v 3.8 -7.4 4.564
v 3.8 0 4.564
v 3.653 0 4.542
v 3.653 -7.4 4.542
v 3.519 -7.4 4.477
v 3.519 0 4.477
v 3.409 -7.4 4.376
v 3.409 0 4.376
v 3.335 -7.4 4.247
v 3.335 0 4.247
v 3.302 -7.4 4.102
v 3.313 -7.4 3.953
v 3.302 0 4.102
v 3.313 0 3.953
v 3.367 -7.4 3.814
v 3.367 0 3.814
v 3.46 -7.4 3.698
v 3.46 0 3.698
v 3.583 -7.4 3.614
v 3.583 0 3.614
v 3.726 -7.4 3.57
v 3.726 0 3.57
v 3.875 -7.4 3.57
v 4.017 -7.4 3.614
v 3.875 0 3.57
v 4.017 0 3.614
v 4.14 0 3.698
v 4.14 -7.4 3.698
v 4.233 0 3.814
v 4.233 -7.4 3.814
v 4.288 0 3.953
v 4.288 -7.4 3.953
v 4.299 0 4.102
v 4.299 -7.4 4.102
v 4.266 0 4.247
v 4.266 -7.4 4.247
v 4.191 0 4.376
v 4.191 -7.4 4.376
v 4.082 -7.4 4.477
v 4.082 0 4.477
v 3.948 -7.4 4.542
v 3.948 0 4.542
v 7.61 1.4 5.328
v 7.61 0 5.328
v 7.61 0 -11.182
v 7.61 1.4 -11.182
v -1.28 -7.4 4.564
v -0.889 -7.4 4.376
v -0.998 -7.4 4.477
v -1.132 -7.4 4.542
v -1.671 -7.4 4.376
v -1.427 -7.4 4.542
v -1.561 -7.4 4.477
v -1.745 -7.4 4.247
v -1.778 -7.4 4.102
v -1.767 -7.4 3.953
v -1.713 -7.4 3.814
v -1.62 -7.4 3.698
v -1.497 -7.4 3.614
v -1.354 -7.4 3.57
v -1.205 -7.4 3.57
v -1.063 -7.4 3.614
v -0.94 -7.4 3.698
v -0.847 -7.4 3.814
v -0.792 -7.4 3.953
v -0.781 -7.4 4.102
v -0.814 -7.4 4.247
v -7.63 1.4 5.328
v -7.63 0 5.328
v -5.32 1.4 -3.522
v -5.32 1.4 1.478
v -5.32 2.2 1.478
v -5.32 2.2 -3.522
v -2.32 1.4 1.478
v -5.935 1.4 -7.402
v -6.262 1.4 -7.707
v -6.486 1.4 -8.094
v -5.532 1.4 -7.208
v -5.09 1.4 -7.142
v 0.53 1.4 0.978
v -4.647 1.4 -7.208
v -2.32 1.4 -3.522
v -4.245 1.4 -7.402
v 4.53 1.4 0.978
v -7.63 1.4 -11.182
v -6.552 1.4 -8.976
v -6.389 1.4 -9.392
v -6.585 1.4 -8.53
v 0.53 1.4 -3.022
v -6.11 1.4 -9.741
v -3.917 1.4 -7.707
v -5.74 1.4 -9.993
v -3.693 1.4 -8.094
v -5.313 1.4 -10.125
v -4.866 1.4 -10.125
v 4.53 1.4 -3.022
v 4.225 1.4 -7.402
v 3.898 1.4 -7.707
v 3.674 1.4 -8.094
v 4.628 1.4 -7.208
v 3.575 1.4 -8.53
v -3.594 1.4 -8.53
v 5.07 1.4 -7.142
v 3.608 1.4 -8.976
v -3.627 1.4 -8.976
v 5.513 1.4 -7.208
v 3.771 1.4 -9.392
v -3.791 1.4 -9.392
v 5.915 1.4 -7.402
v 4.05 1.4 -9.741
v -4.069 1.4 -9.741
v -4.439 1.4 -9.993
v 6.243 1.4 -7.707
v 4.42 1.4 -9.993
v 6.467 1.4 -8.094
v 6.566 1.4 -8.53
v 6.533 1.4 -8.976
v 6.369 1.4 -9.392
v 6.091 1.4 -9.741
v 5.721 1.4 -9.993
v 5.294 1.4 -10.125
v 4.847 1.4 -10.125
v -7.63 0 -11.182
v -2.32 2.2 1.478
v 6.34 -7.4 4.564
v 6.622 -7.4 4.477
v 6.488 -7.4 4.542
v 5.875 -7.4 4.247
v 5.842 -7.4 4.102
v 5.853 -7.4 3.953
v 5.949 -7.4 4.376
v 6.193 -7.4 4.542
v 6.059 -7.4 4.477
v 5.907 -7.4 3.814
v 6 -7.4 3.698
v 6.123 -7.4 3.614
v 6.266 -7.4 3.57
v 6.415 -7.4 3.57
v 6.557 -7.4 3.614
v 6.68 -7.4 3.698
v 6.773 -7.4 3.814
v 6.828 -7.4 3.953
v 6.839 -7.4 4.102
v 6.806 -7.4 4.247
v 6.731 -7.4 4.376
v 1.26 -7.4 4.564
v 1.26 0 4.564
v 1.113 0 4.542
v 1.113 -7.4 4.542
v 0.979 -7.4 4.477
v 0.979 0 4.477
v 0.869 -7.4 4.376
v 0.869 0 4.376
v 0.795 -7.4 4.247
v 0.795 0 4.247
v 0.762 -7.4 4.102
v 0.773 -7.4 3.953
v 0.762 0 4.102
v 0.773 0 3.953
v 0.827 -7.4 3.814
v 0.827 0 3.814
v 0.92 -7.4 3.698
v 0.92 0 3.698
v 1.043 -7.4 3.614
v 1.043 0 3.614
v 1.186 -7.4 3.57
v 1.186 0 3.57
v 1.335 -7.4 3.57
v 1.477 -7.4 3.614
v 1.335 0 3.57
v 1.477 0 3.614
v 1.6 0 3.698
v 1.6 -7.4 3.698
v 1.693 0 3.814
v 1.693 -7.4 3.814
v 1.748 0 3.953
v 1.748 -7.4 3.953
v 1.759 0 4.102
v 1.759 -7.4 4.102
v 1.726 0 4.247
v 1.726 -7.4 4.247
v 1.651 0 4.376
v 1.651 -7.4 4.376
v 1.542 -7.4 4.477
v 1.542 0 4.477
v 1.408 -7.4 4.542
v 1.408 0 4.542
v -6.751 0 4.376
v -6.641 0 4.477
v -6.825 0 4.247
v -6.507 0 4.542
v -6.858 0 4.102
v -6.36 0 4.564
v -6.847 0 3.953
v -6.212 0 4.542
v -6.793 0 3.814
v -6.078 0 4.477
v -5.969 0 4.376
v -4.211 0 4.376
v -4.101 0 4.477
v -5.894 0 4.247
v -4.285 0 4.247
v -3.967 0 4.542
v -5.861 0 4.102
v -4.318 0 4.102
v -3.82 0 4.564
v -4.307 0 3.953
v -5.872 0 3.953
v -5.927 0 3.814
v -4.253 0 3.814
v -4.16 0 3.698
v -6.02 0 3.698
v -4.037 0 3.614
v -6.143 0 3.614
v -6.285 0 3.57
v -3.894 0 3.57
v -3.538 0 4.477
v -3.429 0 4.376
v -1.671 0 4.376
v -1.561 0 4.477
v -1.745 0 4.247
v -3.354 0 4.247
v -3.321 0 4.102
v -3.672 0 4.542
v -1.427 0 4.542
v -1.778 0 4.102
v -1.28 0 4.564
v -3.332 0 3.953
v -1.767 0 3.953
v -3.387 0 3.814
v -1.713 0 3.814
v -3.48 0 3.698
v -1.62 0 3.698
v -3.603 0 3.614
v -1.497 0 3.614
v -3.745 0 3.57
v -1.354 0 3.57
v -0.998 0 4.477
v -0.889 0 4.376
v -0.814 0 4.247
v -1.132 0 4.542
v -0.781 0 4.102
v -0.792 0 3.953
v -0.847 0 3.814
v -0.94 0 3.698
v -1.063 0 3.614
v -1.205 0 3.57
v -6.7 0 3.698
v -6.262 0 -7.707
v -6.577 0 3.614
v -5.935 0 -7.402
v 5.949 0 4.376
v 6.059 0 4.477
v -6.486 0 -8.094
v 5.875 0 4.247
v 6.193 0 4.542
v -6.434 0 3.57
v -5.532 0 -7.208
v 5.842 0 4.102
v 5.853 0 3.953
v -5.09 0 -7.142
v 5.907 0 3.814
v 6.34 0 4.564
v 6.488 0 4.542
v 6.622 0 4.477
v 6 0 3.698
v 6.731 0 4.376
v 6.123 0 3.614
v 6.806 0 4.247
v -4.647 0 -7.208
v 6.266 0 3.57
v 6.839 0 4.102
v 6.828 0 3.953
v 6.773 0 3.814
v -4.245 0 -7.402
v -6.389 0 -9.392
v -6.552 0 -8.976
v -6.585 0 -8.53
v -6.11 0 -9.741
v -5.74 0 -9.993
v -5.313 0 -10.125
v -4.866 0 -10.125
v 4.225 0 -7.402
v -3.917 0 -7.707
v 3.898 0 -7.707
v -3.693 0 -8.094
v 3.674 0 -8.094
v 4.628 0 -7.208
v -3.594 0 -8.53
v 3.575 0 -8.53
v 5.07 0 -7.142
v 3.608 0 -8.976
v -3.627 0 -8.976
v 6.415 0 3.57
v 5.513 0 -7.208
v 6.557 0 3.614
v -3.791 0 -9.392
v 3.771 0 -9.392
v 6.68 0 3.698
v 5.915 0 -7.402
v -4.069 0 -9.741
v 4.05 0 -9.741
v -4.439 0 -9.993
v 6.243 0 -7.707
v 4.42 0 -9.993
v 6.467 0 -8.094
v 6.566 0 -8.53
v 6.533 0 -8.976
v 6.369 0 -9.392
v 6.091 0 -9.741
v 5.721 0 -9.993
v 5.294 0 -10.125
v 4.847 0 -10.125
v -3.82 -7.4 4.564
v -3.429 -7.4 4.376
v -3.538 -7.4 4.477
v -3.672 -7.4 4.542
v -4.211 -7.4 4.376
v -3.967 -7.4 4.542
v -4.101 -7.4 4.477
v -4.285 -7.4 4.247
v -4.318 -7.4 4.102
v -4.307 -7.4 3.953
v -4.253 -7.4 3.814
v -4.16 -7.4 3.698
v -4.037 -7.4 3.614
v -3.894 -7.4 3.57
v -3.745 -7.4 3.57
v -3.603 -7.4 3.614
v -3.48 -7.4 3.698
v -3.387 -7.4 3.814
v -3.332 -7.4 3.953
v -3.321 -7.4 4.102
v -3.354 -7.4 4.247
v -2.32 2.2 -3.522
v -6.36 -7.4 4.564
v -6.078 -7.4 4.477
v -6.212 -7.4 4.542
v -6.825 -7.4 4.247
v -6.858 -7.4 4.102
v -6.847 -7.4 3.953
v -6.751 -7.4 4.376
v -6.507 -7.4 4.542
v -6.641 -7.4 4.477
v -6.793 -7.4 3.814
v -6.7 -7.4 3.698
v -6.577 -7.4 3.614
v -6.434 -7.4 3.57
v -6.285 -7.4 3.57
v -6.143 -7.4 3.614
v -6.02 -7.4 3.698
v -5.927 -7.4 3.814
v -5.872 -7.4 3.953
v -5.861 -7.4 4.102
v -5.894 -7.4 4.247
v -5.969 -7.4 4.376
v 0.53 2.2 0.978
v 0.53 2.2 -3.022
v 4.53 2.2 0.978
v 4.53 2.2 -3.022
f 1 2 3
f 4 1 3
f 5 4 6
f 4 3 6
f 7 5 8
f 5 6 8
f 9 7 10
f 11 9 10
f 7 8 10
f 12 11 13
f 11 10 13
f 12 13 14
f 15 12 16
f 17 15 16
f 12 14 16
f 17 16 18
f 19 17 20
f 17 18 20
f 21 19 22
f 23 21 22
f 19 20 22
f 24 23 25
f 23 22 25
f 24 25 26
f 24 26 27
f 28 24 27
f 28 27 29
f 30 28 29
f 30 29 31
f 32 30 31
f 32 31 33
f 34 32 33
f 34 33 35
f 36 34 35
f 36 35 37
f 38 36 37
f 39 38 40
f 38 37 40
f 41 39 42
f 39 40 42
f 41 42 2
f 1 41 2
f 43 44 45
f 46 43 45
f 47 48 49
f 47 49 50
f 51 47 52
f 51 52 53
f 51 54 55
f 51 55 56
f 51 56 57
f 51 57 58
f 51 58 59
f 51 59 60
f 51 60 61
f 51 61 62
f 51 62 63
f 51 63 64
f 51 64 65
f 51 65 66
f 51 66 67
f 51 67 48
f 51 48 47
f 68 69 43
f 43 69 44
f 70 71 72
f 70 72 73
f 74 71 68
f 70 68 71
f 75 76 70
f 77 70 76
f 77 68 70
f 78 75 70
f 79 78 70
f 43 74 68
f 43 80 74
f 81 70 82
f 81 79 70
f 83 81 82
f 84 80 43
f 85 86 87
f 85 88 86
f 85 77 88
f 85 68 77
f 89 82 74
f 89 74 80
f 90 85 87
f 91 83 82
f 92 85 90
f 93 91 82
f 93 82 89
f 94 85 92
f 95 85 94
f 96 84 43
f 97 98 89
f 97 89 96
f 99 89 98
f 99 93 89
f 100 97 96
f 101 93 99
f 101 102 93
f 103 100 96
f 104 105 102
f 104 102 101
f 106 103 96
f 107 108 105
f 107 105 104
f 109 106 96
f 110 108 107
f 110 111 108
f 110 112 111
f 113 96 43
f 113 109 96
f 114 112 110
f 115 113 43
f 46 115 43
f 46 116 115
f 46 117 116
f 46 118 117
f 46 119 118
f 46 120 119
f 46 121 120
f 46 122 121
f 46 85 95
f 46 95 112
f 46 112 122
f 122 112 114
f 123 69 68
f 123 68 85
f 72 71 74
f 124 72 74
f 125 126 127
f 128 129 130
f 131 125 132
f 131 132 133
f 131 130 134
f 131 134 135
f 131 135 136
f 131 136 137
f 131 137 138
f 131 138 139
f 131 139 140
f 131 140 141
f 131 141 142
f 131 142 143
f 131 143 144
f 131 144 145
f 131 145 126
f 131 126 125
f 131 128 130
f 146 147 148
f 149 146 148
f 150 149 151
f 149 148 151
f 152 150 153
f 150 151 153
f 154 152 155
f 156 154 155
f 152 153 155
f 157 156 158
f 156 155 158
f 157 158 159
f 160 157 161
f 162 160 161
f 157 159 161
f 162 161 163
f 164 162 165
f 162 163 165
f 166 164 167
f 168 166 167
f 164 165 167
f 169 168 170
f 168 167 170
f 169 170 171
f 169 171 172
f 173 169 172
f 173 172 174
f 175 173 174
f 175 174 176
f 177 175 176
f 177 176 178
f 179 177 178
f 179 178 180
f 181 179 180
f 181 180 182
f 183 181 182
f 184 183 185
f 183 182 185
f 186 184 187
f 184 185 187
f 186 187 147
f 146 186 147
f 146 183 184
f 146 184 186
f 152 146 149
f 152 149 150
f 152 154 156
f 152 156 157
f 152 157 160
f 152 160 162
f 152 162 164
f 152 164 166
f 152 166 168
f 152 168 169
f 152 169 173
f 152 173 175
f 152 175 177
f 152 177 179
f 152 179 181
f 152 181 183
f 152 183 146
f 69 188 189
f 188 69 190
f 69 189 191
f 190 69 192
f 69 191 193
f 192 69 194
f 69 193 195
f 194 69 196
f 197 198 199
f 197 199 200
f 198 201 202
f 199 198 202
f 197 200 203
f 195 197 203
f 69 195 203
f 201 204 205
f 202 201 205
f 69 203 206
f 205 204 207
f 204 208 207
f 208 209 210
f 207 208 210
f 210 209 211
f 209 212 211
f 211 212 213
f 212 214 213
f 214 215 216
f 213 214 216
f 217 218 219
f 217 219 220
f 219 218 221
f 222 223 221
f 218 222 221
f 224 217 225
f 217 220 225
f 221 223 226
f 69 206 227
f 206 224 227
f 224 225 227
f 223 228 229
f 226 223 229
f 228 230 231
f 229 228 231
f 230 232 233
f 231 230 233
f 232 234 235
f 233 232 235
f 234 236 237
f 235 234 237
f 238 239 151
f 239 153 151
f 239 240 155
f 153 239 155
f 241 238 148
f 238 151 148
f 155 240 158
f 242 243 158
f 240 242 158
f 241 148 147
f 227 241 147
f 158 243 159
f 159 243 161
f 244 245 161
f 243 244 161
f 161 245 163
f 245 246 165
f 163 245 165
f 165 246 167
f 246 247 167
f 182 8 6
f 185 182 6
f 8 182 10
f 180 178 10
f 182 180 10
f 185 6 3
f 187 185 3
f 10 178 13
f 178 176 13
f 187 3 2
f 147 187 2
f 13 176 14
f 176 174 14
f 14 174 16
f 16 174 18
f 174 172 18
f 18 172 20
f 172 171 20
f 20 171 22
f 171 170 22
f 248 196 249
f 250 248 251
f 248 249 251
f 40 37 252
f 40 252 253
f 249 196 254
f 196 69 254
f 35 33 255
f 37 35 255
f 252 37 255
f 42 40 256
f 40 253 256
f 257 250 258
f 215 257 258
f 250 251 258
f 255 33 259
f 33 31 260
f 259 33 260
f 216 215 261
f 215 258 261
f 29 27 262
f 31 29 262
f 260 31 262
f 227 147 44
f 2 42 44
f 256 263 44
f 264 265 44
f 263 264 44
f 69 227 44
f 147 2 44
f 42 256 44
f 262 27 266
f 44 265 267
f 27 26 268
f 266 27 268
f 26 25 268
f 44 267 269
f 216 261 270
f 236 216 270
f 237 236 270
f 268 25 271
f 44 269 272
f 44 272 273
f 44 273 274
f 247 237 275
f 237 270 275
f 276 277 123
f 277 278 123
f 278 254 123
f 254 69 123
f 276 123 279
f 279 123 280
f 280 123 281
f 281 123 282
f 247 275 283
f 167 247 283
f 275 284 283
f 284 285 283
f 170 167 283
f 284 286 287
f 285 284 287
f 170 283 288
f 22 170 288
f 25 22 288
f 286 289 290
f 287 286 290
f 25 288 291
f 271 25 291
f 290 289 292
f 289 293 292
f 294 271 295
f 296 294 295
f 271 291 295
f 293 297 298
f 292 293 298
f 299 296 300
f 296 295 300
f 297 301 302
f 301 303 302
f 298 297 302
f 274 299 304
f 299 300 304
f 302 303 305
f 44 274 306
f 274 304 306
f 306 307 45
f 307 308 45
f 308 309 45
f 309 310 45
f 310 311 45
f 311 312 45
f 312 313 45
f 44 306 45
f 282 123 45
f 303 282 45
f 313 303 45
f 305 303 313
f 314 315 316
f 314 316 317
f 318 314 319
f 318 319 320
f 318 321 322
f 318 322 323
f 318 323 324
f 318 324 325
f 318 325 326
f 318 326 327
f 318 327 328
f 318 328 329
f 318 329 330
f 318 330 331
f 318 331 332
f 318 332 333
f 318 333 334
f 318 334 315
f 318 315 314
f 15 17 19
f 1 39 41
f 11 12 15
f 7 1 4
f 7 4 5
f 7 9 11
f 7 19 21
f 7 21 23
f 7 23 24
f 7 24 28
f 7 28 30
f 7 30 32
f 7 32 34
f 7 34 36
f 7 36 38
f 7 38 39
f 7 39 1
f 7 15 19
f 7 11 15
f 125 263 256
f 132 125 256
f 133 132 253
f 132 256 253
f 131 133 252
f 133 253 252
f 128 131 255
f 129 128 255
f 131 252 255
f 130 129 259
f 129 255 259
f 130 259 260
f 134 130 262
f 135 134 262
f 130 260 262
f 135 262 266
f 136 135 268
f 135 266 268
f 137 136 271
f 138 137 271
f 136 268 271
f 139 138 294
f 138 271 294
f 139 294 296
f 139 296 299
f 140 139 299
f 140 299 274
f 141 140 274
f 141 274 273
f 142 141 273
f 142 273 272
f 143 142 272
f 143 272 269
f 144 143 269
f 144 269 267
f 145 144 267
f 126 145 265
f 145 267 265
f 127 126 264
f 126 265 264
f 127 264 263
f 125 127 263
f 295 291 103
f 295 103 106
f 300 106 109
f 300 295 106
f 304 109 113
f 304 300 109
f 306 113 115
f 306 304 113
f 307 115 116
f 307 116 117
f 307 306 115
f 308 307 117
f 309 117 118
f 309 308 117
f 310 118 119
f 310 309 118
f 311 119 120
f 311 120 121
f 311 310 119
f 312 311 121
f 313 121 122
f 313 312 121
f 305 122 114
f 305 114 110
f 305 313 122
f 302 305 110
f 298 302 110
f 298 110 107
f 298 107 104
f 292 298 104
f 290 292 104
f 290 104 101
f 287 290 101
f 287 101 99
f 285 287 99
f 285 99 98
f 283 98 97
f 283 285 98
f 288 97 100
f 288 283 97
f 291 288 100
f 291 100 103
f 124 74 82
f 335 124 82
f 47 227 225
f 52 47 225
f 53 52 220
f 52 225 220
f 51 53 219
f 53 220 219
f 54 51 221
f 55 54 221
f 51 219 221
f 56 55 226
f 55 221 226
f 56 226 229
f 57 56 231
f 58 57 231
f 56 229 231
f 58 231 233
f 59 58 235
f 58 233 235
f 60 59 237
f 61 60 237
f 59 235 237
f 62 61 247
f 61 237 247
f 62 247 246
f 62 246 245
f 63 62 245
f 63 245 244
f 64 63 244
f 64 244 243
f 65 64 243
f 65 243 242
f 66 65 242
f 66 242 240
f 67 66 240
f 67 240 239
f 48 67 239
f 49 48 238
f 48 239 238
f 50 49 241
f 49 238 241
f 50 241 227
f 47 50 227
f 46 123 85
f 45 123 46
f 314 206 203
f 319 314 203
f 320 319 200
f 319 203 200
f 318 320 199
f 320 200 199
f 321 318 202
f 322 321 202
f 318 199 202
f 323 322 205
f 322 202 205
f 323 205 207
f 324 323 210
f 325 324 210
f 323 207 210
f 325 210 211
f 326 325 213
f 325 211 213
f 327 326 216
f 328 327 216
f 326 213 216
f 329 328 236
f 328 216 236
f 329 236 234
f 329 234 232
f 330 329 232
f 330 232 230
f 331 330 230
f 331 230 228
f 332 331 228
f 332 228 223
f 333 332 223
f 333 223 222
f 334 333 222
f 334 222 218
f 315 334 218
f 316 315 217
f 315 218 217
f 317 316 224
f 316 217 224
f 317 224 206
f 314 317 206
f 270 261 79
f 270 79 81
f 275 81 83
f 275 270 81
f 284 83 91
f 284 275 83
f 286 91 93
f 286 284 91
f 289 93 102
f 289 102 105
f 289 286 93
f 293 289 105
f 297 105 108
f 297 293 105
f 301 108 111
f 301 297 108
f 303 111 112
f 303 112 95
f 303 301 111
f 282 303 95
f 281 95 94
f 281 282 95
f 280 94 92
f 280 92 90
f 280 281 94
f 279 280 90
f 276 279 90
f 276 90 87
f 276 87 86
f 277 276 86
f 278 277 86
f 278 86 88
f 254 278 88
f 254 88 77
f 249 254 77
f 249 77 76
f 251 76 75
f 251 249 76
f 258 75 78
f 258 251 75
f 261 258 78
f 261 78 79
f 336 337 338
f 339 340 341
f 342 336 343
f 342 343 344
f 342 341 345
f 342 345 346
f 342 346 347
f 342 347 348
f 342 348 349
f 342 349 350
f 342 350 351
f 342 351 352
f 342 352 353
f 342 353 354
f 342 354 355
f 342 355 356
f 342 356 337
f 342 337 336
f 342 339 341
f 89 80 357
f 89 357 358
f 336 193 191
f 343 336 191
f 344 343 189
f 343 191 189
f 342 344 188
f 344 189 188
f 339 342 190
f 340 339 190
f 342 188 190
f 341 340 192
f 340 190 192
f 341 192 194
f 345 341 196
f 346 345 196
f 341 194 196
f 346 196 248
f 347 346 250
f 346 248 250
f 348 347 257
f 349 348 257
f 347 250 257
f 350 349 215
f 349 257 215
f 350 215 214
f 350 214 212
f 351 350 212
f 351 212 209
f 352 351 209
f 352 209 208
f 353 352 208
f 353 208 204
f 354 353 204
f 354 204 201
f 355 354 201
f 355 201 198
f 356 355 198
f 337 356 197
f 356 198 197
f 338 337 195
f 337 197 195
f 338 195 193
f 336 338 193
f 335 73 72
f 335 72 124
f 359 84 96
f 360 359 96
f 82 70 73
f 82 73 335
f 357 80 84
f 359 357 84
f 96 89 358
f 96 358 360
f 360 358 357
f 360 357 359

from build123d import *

# Parameters (mm, degrees)
ESQUISSE1_W        = 15.24
ESQUISSE1_H        = 16.51
ESQUISSE1_R        = 1.5
PCB_DEPTH          = 1.4
ESQUISSE2_W        = 3
ESQUISSE2_H        = 5
ADXL345_DEPTH      = 0.8
ESQUISSE3_W        = 4
ESQUISSE3_H        = 4
ITG_3200_DEPTH     = 0.8
ESQUISSE6_R        = 0.5
BOSS_EXTRU_9_DEPTH = 7.4


with BuildPart() as part:
    # Esquisse1 → PCB (new body)
    with BuildSketch(Plane(origin=(0, 0, 0), x_dir=(1, 0, 0), z_dir=(0, 1, 0))):
        with Locations((-0.009586777, 2.926831956)):
            Rectangle(ESQUISSE1_W, ESQUISSE1_H)
        with Locations(Location((-5.089586777, 8.641831956, 0), (0, 0, 270))):
            Circle(ESQUISSE1_R, mode=Mode.SUBTRACT)
        with Locations(Location((5.070413223, 8.641831956, 0), (0, 0, 270))):
            Circle(ESQUISSE1_R, mode=Mode.SUBTRACT)
    extrude(amount=PCB_DEPTH)

    # Esquisse2 → ADXL345 (add)
    with BuildSketch(Plane(origin=(0, 1.4, 0), x_dir=(1, 0, 0), z_dir=(0, 1, 0))):
        with Locations((-3.819586777, 1.021831956)):
            Rectangle(ESQUISSE2_W, ESQUISSE2_H)
    extrude(amount=ADXL345_DEPTH)

    # Esquisse3 → ITG-3200 (add)
    with BuildSketch(Plane(origin=(0, 1.4, 0), x_dir=(1, 0, 0), z_dir=(0, 1, 0))):
        with Locations((2.530413223, 1.021831956)):
            Rectangle(ESQUISSE3_W, ESQUISSE3_H)
    extrude(amount=ITG_3200_DEPTH)

    # Esquisse6 → Boss.-Extru.9 (add)
    with BuildSketch(Plane.XZ):
        with Locations(Location((-6.359586777, 4.064307622, 0), (0, 0, 90))):
            Circle(ESQUISSE6_R)
        with Locations(Location((-3.819586777, 4.064307622, 0), (0, 0, 90))):
            Circle(ESQUISSE6_R)
        with Locations(Location((-1.279586777, 4.064307622, 0), (0, 0, 90))):
            Circle(ESQUISSE6_R)
        with Locations(Location((1.260413223, 4.064307622, 0), (0, 0, 90))):
            Circle(ESQUISSE6_R)
        with Locations(Location((3.800413223, 4.064307622, 0), (0, 0, 90))):
            Circle(ESQUISSE6_R)
        with Locations(Location((6.340413223, 4.064307622, 0), (0, 0, 90))):
            Circle(ESQUISSE6_R)
    extrude(amount=BOSS_EXTRU_9_DEPTH)


solid = part.part
